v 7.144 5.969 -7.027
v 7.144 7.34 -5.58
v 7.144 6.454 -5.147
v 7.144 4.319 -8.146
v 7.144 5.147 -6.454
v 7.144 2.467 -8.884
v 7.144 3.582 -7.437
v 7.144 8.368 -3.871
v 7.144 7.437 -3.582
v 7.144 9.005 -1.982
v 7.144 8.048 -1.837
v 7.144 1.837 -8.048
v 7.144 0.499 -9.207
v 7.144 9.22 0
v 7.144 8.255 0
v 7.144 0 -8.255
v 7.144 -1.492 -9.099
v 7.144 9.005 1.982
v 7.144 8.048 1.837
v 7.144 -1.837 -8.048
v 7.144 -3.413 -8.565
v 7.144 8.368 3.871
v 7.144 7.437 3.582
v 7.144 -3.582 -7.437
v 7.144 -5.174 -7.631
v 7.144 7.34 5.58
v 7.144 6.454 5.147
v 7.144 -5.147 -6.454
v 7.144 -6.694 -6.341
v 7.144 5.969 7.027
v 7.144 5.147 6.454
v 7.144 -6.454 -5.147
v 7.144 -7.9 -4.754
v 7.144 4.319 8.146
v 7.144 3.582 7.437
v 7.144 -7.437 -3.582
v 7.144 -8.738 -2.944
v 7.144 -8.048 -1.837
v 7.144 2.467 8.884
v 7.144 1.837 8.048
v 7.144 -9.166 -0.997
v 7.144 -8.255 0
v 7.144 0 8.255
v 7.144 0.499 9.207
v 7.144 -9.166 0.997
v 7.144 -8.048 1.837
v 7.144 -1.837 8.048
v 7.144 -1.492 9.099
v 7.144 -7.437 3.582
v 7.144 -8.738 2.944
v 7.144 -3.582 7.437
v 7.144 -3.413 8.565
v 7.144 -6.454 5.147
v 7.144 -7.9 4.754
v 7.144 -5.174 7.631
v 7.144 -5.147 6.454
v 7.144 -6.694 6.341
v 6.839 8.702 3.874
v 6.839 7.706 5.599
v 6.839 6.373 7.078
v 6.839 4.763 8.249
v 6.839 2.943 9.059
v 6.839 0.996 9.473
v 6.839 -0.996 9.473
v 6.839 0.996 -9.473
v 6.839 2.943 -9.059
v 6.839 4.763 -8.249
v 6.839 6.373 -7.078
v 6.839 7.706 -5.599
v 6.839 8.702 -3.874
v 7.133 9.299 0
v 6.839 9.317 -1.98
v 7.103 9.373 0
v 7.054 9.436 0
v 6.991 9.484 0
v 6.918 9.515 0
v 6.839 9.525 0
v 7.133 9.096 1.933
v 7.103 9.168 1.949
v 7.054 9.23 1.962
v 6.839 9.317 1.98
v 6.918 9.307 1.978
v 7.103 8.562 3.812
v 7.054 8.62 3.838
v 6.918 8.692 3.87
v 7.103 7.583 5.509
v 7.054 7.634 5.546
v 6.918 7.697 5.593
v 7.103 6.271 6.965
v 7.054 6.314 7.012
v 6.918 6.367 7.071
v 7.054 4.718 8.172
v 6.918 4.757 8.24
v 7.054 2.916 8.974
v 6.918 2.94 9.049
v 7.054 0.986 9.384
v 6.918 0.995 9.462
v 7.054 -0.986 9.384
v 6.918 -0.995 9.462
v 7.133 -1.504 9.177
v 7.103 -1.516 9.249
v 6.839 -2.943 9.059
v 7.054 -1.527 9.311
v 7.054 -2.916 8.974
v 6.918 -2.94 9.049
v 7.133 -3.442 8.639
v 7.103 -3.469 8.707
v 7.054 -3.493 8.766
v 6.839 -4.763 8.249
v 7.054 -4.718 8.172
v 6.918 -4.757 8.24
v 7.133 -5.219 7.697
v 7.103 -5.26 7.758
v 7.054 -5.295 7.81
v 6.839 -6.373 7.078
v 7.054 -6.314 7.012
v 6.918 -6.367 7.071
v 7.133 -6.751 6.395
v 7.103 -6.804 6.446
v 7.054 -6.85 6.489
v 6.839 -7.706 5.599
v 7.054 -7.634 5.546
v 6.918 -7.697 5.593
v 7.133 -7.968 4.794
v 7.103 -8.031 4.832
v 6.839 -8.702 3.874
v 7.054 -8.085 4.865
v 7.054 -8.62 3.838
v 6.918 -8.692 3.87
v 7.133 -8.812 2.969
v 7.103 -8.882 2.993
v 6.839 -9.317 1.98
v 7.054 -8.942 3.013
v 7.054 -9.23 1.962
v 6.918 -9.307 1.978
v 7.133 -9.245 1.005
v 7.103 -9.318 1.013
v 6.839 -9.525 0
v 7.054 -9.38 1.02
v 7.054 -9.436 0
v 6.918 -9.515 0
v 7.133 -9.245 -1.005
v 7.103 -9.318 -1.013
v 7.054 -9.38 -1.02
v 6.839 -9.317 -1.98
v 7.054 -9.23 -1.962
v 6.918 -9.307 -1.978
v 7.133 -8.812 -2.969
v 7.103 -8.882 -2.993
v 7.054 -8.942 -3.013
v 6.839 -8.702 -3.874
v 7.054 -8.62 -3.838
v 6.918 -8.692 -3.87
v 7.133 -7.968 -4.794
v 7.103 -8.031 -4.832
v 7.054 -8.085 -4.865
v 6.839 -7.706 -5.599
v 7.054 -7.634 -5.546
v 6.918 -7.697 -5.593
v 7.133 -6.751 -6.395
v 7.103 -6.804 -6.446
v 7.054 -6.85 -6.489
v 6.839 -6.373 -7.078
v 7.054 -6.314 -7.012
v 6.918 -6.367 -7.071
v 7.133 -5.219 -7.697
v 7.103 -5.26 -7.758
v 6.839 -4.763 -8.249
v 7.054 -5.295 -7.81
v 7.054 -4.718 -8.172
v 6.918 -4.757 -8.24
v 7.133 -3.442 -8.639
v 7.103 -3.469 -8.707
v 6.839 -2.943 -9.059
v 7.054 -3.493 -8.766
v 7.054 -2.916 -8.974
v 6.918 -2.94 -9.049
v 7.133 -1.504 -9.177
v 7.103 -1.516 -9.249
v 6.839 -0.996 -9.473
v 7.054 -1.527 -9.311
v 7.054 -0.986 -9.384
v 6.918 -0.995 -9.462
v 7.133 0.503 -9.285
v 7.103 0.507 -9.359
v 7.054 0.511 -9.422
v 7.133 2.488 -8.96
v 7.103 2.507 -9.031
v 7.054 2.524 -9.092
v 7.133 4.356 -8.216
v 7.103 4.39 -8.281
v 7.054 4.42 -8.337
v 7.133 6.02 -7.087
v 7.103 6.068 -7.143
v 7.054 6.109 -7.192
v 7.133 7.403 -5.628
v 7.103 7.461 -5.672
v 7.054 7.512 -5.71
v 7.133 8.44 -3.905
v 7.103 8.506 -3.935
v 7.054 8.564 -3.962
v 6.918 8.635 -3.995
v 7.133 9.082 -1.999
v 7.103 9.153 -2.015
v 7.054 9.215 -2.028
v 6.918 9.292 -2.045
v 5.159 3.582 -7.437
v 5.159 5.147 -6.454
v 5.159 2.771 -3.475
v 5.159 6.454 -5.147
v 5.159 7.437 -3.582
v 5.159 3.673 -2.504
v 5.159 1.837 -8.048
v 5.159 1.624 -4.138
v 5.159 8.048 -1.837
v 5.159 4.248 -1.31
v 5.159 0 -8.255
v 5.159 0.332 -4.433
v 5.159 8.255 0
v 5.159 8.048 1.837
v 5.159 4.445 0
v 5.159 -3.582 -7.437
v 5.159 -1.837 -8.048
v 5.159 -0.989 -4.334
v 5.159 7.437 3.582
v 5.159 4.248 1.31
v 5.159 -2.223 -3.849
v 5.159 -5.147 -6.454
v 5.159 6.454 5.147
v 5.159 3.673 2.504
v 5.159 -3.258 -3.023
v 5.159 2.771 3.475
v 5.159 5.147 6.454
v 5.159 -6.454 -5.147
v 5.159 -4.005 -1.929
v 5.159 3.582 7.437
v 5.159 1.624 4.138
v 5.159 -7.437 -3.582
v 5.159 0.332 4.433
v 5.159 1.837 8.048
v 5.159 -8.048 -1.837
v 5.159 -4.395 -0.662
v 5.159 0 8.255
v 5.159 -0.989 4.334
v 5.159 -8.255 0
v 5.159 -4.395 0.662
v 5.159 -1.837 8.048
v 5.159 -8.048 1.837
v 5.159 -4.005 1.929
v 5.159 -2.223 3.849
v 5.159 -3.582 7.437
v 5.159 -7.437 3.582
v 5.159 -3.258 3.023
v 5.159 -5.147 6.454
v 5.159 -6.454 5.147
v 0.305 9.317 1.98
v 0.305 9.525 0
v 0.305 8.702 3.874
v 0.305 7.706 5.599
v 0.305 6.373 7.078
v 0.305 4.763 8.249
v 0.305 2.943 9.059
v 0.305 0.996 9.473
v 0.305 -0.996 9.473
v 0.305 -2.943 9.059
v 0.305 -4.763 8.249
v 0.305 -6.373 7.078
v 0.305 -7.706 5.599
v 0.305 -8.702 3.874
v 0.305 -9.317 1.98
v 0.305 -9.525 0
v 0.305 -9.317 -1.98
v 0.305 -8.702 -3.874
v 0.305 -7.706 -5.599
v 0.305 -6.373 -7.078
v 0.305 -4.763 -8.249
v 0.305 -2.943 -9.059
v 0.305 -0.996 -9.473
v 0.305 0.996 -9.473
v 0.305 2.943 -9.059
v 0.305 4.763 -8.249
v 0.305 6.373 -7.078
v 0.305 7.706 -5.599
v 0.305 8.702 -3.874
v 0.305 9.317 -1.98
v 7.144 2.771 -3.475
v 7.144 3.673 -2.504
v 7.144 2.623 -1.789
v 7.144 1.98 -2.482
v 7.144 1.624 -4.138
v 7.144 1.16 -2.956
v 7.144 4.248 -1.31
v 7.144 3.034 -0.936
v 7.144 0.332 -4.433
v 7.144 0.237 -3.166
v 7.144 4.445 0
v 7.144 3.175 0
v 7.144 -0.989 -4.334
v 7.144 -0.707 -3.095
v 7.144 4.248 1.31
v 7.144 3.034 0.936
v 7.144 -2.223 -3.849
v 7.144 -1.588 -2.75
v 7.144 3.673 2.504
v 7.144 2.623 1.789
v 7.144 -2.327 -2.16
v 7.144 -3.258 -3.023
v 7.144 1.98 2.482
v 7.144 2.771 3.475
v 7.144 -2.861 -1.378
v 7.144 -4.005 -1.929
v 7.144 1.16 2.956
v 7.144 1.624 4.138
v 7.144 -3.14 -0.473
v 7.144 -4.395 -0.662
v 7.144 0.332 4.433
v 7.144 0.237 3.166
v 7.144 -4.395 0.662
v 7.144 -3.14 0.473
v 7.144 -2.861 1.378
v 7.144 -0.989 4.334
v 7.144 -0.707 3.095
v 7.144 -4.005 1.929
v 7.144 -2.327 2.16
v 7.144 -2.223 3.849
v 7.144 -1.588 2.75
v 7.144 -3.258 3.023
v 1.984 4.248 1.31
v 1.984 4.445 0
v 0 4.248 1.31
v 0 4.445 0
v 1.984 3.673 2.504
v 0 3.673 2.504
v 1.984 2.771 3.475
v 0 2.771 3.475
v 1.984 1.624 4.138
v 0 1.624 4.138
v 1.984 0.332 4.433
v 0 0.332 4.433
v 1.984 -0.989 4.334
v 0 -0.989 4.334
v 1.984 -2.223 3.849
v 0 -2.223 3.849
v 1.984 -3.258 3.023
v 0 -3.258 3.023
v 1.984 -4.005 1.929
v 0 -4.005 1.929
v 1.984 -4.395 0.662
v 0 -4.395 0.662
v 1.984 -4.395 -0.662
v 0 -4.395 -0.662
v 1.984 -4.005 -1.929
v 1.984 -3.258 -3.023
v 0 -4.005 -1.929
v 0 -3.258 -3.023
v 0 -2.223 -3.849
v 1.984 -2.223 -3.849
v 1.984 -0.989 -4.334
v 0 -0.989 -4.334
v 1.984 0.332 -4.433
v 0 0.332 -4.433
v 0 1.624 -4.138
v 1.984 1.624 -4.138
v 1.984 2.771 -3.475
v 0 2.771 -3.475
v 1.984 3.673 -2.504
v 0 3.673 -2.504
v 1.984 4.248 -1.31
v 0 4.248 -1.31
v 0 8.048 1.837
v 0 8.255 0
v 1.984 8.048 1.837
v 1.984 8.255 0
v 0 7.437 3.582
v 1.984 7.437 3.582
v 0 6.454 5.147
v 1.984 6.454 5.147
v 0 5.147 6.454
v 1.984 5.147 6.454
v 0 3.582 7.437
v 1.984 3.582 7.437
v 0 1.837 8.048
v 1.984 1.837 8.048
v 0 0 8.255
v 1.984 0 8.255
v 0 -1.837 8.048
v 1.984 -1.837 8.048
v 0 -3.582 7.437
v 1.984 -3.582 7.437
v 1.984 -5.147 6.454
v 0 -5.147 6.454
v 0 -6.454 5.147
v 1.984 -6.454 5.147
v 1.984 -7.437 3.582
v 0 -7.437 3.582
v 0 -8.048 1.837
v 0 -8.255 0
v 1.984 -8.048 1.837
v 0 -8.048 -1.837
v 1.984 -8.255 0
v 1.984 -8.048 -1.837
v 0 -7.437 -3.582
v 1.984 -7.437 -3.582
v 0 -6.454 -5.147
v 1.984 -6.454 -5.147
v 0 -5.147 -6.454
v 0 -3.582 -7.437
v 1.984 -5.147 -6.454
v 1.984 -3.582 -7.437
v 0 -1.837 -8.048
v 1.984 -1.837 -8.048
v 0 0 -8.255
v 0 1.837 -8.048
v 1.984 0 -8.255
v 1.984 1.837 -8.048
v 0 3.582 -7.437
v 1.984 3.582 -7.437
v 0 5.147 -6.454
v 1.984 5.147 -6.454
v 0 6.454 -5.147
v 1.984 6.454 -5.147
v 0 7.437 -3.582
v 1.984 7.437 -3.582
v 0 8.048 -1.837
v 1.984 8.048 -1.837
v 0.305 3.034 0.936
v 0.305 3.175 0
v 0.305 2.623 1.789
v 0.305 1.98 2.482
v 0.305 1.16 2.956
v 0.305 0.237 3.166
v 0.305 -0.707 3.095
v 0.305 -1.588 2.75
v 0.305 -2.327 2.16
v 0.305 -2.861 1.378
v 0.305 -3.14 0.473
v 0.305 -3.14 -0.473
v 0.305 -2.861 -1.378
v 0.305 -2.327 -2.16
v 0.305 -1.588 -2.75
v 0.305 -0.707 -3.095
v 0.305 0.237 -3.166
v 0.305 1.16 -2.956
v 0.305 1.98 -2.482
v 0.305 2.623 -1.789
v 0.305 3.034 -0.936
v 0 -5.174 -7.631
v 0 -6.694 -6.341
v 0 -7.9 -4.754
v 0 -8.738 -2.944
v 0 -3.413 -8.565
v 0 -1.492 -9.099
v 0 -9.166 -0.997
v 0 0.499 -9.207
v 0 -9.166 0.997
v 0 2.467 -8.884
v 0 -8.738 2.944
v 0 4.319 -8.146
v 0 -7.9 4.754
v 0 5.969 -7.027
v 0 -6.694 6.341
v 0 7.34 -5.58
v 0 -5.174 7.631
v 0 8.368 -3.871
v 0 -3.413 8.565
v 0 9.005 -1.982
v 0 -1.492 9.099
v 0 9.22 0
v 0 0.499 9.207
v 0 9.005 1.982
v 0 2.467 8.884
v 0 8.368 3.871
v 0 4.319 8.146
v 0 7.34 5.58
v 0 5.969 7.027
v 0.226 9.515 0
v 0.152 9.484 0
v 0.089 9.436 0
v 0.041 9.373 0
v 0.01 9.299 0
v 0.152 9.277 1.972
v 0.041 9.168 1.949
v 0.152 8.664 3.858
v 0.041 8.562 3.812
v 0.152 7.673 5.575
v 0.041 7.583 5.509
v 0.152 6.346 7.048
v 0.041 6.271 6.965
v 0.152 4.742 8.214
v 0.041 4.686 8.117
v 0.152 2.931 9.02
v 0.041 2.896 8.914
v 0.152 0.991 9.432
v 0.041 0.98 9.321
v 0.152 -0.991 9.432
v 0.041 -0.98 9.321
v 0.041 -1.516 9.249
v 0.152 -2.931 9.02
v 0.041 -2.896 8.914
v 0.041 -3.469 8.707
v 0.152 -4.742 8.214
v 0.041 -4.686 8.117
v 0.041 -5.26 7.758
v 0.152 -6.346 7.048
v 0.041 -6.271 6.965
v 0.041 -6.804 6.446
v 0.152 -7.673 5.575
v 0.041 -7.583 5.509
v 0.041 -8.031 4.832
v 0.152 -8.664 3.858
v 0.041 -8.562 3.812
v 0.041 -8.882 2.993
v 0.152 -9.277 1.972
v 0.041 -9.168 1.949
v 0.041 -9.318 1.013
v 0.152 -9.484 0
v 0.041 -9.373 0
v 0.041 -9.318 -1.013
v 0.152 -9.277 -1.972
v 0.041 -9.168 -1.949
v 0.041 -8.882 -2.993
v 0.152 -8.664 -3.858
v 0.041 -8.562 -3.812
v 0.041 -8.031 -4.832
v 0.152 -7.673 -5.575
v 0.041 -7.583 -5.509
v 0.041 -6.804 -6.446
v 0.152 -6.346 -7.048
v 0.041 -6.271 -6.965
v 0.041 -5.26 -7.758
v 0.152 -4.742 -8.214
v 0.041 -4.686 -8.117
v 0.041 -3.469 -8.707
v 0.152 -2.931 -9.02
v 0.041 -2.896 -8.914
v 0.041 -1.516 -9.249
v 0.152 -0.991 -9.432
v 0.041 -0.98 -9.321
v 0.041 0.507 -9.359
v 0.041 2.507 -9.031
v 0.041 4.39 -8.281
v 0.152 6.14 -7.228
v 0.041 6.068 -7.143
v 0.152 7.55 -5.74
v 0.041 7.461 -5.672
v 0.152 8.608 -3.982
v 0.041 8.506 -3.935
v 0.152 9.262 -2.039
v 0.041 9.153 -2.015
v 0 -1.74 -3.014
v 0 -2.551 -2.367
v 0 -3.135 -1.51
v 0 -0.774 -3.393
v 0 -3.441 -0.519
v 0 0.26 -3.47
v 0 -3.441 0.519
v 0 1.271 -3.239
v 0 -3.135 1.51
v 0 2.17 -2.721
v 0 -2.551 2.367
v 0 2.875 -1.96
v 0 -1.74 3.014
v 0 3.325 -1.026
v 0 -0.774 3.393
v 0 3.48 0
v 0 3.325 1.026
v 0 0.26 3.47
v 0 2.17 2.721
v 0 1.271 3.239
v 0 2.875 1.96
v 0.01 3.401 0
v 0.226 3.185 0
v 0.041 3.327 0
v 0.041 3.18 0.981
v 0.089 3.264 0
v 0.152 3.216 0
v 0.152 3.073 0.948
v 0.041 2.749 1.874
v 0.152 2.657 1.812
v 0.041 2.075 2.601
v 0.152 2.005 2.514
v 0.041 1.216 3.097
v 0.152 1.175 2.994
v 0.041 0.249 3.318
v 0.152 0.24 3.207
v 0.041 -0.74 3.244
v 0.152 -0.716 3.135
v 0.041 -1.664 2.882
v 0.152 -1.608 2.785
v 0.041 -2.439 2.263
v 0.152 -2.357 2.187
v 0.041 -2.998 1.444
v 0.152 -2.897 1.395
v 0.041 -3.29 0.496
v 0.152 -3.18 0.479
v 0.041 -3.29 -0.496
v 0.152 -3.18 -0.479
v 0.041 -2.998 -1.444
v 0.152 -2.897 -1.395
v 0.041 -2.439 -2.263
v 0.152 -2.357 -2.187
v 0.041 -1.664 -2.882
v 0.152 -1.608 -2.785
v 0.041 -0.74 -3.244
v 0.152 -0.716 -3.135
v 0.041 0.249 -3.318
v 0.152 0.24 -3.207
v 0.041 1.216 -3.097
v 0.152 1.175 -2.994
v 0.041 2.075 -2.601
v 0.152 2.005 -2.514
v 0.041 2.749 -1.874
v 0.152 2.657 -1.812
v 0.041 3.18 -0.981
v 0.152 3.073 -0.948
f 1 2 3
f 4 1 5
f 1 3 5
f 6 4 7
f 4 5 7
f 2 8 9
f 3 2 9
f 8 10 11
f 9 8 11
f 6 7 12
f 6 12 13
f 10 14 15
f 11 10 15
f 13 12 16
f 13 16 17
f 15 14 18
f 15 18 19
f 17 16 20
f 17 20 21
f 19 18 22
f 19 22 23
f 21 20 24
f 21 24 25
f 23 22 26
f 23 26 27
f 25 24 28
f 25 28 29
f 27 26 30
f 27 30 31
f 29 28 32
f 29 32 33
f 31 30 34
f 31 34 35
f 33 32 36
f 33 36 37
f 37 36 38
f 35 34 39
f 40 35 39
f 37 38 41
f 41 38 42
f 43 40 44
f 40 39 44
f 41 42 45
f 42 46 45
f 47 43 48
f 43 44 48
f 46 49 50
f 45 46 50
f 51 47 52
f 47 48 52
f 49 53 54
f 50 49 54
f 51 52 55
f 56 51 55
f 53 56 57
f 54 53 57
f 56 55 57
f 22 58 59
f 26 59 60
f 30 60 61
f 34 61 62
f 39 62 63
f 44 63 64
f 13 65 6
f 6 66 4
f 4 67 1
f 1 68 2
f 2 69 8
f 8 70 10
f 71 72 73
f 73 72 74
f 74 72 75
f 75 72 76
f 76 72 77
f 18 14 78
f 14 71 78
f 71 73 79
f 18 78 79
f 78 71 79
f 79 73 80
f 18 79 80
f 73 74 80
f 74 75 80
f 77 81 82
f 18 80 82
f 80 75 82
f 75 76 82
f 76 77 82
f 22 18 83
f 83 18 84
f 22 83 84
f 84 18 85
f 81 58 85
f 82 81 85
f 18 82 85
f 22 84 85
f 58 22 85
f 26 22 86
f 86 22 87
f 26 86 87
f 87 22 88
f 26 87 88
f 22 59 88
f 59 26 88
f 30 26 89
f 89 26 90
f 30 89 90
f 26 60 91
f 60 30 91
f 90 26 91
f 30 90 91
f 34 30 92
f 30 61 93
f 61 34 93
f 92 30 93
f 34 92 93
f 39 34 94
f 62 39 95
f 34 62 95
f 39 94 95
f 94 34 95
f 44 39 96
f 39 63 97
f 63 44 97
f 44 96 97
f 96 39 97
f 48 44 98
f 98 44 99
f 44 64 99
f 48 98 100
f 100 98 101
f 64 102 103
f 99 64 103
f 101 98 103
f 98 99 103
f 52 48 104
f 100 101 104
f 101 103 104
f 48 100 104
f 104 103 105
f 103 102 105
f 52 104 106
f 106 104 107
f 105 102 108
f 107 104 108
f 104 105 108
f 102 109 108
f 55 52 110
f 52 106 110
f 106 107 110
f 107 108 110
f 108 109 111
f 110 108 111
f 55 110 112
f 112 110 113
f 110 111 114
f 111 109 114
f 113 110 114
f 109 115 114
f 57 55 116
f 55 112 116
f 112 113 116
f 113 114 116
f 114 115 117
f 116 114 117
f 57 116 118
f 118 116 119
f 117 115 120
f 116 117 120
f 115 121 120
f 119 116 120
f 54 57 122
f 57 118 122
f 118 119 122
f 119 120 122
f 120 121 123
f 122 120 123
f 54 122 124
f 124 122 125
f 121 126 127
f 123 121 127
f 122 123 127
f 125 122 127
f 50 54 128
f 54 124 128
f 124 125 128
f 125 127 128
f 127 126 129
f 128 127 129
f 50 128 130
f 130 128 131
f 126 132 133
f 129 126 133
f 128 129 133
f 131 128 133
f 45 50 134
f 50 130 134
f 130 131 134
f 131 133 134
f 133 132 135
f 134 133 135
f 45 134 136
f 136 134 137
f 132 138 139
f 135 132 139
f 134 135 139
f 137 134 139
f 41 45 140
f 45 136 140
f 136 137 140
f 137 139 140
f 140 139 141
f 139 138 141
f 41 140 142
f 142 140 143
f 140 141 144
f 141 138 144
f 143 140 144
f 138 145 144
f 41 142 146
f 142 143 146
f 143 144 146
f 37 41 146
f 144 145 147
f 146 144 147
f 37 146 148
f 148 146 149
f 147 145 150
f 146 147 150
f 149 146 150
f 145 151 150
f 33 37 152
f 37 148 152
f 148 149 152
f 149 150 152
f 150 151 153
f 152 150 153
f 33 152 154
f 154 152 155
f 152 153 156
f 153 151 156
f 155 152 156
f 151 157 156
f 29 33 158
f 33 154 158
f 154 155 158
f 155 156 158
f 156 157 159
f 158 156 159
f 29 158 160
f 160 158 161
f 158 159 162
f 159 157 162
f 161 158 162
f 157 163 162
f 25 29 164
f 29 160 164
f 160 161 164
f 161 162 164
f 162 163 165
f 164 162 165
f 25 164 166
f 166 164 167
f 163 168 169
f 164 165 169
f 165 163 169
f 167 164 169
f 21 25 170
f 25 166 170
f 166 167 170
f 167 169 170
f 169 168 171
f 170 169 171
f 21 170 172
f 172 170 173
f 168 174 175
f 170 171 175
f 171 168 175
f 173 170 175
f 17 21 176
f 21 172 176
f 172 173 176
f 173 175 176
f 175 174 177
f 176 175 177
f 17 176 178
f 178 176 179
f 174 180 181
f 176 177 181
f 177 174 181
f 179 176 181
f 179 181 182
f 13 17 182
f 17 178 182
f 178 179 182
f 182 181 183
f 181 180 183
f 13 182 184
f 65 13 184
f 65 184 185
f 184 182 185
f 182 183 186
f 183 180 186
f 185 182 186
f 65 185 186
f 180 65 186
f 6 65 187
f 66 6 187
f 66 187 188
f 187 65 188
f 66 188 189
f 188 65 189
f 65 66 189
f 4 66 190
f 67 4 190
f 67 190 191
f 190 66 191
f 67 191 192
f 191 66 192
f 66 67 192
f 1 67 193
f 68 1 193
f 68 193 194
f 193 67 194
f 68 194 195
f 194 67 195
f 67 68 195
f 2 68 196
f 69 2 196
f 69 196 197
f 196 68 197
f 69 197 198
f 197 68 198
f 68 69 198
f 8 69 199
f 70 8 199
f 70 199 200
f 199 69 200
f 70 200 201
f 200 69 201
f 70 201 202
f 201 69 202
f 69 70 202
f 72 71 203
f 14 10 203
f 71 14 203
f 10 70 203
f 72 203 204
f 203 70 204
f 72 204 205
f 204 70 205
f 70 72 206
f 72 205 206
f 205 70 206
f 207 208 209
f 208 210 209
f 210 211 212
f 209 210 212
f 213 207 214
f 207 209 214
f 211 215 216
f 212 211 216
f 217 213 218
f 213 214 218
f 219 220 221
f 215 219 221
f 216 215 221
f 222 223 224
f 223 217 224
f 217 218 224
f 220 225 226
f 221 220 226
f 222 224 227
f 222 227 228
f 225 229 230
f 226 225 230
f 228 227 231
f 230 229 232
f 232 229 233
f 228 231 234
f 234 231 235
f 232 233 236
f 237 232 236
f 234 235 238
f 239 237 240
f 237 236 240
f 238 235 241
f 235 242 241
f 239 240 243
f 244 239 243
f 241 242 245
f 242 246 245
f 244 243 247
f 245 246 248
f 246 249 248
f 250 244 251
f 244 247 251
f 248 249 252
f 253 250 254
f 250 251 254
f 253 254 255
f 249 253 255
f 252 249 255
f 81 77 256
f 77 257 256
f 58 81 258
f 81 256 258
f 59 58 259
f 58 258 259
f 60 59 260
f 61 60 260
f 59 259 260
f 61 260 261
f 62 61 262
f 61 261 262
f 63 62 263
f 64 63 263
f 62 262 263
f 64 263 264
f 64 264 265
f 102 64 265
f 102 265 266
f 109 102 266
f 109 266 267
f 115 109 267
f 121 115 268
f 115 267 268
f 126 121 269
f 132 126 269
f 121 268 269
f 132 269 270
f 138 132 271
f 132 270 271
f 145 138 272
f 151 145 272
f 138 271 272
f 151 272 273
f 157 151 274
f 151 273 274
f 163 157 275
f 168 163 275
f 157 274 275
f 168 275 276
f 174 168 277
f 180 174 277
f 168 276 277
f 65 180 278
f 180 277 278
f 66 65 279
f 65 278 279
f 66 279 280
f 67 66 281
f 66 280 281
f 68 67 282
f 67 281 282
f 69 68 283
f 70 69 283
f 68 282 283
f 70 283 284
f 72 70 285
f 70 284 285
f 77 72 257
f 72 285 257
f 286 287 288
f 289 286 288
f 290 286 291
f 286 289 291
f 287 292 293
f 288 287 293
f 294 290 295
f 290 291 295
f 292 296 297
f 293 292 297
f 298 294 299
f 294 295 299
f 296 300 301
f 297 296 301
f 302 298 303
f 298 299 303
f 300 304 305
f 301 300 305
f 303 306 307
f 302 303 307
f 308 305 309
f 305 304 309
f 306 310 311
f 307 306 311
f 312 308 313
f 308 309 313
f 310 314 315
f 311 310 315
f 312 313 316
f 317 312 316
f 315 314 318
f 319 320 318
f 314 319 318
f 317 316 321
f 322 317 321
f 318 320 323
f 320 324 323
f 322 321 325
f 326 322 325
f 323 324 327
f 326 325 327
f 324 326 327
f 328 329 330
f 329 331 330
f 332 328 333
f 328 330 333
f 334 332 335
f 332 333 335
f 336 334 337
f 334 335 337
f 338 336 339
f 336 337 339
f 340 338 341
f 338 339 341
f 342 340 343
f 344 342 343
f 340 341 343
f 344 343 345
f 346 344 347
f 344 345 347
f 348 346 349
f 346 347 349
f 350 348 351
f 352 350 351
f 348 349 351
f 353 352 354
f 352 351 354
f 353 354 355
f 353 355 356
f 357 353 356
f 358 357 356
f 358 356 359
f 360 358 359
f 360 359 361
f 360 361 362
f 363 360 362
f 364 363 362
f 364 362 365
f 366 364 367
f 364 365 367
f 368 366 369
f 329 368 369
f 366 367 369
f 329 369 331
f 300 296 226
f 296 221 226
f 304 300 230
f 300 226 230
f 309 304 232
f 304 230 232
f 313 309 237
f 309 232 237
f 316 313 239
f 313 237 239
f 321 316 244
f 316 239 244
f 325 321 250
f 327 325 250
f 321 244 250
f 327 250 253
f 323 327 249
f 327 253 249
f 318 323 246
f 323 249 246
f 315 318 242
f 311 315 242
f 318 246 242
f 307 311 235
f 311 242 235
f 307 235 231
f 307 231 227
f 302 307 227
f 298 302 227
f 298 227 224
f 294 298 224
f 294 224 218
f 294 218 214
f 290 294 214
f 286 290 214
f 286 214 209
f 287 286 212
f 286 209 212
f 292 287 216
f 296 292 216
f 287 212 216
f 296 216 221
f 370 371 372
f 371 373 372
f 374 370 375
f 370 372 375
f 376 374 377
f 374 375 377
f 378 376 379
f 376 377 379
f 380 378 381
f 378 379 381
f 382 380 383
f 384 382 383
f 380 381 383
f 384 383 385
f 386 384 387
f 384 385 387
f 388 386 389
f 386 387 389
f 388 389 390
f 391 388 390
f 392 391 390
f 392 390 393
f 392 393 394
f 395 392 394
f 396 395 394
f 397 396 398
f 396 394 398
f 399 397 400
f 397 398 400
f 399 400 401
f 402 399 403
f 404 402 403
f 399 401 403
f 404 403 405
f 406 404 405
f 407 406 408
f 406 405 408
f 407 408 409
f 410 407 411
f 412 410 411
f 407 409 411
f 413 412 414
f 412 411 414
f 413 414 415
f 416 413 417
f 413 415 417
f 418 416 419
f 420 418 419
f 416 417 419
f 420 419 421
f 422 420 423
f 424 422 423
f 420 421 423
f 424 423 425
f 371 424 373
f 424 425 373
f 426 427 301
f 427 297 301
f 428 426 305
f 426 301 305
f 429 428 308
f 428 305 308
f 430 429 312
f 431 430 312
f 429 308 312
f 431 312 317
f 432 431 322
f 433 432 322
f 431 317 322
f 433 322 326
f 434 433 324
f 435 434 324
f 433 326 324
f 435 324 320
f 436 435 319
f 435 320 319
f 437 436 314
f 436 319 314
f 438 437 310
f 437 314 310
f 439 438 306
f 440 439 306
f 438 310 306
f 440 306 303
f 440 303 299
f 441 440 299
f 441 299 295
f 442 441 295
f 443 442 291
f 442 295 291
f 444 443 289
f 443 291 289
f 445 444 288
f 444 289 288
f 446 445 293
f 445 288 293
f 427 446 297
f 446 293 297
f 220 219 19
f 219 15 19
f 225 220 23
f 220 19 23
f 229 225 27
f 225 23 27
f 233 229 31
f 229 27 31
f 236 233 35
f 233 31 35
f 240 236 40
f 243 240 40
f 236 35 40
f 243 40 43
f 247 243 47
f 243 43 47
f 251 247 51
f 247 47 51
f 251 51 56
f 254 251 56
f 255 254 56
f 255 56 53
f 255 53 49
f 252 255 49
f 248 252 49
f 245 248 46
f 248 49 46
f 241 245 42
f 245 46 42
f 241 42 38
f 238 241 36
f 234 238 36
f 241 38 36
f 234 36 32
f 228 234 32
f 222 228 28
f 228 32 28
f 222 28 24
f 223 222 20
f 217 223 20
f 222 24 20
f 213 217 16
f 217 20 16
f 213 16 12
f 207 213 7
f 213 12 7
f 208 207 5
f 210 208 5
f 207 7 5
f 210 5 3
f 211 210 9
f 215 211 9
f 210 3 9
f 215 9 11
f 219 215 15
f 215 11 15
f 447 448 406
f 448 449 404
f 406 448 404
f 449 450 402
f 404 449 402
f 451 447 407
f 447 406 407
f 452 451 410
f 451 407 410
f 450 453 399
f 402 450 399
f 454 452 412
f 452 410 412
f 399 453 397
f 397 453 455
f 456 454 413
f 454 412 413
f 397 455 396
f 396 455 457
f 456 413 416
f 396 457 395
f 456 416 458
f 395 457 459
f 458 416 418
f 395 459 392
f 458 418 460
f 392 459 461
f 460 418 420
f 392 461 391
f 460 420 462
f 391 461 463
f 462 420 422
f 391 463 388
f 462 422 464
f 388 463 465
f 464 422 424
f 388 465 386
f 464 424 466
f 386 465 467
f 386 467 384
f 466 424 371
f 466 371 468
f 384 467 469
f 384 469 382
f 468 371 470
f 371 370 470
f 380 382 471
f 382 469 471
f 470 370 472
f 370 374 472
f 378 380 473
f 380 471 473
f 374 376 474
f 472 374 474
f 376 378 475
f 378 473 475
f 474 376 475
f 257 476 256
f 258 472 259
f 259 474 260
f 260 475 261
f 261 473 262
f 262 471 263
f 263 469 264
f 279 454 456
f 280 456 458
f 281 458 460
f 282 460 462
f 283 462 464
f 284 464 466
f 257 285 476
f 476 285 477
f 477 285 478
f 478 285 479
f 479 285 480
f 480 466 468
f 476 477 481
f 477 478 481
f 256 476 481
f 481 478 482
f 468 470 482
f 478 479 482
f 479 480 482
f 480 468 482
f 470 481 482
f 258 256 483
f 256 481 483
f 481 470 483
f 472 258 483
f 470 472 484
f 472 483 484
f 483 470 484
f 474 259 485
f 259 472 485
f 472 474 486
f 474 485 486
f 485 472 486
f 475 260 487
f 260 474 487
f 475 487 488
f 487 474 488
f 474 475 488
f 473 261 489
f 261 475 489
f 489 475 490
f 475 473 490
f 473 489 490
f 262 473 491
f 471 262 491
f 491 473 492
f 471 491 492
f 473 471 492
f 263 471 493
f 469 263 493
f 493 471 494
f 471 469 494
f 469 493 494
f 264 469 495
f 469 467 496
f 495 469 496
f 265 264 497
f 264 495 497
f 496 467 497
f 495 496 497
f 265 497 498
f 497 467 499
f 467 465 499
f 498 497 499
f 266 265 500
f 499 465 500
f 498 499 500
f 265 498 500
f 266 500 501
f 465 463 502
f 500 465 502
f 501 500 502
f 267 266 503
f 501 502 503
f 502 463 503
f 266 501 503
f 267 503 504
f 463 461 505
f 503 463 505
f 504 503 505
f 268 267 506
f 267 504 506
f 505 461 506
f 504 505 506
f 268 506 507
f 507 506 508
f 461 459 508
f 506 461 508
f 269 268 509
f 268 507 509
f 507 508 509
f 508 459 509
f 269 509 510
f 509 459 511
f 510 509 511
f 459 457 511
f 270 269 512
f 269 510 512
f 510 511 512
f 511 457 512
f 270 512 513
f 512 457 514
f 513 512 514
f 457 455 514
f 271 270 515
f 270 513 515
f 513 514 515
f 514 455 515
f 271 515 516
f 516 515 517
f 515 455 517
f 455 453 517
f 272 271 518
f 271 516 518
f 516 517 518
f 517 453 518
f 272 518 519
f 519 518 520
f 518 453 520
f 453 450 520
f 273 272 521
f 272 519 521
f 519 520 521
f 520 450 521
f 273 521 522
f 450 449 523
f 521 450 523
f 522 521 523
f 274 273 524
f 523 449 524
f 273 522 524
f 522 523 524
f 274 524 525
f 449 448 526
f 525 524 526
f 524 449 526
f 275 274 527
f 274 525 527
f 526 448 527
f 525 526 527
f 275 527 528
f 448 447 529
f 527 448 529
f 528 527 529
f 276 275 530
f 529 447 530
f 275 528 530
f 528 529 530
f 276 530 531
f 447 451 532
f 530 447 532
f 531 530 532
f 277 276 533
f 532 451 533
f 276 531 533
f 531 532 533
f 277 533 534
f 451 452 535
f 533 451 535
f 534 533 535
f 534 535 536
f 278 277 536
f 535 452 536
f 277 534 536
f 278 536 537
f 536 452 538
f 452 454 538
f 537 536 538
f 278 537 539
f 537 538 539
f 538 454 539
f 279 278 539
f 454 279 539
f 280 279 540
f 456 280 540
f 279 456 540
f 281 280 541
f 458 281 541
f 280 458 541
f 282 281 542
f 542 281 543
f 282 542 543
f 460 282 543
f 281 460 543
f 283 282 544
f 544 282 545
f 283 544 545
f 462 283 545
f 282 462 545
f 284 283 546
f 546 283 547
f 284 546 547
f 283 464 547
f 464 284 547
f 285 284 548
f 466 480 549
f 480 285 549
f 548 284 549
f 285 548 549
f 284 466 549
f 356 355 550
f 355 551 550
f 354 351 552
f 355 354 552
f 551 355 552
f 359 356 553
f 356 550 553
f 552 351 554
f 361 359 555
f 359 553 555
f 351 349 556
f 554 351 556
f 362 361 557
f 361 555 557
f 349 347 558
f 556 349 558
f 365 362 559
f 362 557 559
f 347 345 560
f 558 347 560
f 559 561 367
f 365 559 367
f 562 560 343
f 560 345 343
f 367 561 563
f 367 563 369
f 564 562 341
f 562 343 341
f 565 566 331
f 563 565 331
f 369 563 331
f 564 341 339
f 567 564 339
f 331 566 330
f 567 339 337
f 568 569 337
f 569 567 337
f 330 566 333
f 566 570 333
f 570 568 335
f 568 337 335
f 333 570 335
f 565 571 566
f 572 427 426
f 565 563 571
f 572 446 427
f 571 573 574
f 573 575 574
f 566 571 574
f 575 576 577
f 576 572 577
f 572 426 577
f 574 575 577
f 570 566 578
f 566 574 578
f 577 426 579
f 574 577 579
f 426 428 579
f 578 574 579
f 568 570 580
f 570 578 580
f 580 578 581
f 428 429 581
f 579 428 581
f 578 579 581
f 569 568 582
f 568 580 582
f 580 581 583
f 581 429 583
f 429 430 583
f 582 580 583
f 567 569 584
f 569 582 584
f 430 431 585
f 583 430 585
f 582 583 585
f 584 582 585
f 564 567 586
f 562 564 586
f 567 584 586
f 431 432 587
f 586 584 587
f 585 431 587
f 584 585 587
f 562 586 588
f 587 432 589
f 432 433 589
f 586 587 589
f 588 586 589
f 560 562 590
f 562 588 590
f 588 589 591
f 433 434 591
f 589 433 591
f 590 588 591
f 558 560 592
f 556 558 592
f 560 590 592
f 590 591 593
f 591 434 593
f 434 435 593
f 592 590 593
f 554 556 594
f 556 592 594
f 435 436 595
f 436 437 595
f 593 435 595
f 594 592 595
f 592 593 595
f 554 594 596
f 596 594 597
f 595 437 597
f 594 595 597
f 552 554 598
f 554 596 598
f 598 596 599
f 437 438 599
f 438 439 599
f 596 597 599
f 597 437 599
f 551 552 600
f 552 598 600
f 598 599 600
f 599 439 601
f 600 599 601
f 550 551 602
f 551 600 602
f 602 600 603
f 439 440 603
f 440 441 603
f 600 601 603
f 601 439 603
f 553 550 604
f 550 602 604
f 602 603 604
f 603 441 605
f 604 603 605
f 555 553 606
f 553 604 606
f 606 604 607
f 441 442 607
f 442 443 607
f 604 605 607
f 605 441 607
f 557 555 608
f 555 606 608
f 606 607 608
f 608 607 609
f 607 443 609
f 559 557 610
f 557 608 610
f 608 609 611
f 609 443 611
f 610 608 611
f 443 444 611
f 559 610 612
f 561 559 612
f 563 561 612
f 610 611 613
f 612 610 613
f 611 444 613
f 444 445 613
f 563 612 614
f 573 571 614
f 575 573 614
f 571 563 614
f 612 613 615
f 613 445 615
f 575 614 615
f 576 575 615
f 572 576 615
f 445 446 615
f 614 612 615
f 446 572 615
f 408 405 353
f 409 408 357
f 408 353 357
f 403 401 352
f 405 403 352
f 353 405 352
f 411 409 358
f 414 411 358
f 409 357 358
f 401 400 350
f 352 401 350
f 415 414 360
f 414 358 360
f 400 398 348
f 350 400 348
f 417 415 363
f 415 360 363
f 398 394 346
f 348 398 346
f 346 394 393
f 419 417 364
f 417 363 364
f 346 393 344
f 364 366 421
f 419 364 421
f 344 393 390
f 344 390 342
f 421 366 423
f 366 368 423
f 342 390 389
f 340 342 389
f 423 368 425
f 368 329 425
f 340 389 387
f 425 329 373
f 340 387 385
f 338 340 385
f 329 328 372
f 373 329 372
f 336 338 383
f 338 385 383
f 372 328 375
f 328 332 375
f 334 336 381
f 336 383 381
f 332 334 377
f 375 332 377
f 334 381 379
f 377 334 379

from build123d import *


with BuildPart() as part:
    # Sketch3 → bearing-revolution (revolve)
    with BuildSketch(Plane.XY):
        with BuildLine():
            Line((0.3048, 3.175), (7.14375, 3.175))
            Line((7.14375, 3.175), (7.14375, 4.445))
            Line((7.14375, 4.445), (5.159375, 4.445))
            Line((5.159375, 4.445), (5.159375, 8.255))
            Line((5.159375, 8.255), (7.14375, 8.255))
            Line((7.14375, 8.255), (7.14375, 9.2202))
            ThreePointArc((7.14375, 9.2202), (7.054476147, 9.435726147), (6.83895, 9.525))
            Line((6.83895, 9.525), (0.3048, 9.525))
            ThreePointArc((0.3048, 9.525), (0.089273853, 9.435726147), (0, 9.2202))
            Line((0, 9.2202), (0, 8.255))
            Line((0, 8.255), (1.984375, 8.255))
            Line((1.984375, 8.255), (1.984375, 4.445))
            Line((1.984375, 4.445), (0, 4.445))
            Line((0, 4.445), (0, 3.4798))
            ThreePointArc((0, 3.4798), (0.089273853, 3.264273853), (0.3048, 3.175))
        make_face()
    revolve(axis=Axis((-4.832058368, 0, 0), (1, 0, 0)))


solid = part.part
